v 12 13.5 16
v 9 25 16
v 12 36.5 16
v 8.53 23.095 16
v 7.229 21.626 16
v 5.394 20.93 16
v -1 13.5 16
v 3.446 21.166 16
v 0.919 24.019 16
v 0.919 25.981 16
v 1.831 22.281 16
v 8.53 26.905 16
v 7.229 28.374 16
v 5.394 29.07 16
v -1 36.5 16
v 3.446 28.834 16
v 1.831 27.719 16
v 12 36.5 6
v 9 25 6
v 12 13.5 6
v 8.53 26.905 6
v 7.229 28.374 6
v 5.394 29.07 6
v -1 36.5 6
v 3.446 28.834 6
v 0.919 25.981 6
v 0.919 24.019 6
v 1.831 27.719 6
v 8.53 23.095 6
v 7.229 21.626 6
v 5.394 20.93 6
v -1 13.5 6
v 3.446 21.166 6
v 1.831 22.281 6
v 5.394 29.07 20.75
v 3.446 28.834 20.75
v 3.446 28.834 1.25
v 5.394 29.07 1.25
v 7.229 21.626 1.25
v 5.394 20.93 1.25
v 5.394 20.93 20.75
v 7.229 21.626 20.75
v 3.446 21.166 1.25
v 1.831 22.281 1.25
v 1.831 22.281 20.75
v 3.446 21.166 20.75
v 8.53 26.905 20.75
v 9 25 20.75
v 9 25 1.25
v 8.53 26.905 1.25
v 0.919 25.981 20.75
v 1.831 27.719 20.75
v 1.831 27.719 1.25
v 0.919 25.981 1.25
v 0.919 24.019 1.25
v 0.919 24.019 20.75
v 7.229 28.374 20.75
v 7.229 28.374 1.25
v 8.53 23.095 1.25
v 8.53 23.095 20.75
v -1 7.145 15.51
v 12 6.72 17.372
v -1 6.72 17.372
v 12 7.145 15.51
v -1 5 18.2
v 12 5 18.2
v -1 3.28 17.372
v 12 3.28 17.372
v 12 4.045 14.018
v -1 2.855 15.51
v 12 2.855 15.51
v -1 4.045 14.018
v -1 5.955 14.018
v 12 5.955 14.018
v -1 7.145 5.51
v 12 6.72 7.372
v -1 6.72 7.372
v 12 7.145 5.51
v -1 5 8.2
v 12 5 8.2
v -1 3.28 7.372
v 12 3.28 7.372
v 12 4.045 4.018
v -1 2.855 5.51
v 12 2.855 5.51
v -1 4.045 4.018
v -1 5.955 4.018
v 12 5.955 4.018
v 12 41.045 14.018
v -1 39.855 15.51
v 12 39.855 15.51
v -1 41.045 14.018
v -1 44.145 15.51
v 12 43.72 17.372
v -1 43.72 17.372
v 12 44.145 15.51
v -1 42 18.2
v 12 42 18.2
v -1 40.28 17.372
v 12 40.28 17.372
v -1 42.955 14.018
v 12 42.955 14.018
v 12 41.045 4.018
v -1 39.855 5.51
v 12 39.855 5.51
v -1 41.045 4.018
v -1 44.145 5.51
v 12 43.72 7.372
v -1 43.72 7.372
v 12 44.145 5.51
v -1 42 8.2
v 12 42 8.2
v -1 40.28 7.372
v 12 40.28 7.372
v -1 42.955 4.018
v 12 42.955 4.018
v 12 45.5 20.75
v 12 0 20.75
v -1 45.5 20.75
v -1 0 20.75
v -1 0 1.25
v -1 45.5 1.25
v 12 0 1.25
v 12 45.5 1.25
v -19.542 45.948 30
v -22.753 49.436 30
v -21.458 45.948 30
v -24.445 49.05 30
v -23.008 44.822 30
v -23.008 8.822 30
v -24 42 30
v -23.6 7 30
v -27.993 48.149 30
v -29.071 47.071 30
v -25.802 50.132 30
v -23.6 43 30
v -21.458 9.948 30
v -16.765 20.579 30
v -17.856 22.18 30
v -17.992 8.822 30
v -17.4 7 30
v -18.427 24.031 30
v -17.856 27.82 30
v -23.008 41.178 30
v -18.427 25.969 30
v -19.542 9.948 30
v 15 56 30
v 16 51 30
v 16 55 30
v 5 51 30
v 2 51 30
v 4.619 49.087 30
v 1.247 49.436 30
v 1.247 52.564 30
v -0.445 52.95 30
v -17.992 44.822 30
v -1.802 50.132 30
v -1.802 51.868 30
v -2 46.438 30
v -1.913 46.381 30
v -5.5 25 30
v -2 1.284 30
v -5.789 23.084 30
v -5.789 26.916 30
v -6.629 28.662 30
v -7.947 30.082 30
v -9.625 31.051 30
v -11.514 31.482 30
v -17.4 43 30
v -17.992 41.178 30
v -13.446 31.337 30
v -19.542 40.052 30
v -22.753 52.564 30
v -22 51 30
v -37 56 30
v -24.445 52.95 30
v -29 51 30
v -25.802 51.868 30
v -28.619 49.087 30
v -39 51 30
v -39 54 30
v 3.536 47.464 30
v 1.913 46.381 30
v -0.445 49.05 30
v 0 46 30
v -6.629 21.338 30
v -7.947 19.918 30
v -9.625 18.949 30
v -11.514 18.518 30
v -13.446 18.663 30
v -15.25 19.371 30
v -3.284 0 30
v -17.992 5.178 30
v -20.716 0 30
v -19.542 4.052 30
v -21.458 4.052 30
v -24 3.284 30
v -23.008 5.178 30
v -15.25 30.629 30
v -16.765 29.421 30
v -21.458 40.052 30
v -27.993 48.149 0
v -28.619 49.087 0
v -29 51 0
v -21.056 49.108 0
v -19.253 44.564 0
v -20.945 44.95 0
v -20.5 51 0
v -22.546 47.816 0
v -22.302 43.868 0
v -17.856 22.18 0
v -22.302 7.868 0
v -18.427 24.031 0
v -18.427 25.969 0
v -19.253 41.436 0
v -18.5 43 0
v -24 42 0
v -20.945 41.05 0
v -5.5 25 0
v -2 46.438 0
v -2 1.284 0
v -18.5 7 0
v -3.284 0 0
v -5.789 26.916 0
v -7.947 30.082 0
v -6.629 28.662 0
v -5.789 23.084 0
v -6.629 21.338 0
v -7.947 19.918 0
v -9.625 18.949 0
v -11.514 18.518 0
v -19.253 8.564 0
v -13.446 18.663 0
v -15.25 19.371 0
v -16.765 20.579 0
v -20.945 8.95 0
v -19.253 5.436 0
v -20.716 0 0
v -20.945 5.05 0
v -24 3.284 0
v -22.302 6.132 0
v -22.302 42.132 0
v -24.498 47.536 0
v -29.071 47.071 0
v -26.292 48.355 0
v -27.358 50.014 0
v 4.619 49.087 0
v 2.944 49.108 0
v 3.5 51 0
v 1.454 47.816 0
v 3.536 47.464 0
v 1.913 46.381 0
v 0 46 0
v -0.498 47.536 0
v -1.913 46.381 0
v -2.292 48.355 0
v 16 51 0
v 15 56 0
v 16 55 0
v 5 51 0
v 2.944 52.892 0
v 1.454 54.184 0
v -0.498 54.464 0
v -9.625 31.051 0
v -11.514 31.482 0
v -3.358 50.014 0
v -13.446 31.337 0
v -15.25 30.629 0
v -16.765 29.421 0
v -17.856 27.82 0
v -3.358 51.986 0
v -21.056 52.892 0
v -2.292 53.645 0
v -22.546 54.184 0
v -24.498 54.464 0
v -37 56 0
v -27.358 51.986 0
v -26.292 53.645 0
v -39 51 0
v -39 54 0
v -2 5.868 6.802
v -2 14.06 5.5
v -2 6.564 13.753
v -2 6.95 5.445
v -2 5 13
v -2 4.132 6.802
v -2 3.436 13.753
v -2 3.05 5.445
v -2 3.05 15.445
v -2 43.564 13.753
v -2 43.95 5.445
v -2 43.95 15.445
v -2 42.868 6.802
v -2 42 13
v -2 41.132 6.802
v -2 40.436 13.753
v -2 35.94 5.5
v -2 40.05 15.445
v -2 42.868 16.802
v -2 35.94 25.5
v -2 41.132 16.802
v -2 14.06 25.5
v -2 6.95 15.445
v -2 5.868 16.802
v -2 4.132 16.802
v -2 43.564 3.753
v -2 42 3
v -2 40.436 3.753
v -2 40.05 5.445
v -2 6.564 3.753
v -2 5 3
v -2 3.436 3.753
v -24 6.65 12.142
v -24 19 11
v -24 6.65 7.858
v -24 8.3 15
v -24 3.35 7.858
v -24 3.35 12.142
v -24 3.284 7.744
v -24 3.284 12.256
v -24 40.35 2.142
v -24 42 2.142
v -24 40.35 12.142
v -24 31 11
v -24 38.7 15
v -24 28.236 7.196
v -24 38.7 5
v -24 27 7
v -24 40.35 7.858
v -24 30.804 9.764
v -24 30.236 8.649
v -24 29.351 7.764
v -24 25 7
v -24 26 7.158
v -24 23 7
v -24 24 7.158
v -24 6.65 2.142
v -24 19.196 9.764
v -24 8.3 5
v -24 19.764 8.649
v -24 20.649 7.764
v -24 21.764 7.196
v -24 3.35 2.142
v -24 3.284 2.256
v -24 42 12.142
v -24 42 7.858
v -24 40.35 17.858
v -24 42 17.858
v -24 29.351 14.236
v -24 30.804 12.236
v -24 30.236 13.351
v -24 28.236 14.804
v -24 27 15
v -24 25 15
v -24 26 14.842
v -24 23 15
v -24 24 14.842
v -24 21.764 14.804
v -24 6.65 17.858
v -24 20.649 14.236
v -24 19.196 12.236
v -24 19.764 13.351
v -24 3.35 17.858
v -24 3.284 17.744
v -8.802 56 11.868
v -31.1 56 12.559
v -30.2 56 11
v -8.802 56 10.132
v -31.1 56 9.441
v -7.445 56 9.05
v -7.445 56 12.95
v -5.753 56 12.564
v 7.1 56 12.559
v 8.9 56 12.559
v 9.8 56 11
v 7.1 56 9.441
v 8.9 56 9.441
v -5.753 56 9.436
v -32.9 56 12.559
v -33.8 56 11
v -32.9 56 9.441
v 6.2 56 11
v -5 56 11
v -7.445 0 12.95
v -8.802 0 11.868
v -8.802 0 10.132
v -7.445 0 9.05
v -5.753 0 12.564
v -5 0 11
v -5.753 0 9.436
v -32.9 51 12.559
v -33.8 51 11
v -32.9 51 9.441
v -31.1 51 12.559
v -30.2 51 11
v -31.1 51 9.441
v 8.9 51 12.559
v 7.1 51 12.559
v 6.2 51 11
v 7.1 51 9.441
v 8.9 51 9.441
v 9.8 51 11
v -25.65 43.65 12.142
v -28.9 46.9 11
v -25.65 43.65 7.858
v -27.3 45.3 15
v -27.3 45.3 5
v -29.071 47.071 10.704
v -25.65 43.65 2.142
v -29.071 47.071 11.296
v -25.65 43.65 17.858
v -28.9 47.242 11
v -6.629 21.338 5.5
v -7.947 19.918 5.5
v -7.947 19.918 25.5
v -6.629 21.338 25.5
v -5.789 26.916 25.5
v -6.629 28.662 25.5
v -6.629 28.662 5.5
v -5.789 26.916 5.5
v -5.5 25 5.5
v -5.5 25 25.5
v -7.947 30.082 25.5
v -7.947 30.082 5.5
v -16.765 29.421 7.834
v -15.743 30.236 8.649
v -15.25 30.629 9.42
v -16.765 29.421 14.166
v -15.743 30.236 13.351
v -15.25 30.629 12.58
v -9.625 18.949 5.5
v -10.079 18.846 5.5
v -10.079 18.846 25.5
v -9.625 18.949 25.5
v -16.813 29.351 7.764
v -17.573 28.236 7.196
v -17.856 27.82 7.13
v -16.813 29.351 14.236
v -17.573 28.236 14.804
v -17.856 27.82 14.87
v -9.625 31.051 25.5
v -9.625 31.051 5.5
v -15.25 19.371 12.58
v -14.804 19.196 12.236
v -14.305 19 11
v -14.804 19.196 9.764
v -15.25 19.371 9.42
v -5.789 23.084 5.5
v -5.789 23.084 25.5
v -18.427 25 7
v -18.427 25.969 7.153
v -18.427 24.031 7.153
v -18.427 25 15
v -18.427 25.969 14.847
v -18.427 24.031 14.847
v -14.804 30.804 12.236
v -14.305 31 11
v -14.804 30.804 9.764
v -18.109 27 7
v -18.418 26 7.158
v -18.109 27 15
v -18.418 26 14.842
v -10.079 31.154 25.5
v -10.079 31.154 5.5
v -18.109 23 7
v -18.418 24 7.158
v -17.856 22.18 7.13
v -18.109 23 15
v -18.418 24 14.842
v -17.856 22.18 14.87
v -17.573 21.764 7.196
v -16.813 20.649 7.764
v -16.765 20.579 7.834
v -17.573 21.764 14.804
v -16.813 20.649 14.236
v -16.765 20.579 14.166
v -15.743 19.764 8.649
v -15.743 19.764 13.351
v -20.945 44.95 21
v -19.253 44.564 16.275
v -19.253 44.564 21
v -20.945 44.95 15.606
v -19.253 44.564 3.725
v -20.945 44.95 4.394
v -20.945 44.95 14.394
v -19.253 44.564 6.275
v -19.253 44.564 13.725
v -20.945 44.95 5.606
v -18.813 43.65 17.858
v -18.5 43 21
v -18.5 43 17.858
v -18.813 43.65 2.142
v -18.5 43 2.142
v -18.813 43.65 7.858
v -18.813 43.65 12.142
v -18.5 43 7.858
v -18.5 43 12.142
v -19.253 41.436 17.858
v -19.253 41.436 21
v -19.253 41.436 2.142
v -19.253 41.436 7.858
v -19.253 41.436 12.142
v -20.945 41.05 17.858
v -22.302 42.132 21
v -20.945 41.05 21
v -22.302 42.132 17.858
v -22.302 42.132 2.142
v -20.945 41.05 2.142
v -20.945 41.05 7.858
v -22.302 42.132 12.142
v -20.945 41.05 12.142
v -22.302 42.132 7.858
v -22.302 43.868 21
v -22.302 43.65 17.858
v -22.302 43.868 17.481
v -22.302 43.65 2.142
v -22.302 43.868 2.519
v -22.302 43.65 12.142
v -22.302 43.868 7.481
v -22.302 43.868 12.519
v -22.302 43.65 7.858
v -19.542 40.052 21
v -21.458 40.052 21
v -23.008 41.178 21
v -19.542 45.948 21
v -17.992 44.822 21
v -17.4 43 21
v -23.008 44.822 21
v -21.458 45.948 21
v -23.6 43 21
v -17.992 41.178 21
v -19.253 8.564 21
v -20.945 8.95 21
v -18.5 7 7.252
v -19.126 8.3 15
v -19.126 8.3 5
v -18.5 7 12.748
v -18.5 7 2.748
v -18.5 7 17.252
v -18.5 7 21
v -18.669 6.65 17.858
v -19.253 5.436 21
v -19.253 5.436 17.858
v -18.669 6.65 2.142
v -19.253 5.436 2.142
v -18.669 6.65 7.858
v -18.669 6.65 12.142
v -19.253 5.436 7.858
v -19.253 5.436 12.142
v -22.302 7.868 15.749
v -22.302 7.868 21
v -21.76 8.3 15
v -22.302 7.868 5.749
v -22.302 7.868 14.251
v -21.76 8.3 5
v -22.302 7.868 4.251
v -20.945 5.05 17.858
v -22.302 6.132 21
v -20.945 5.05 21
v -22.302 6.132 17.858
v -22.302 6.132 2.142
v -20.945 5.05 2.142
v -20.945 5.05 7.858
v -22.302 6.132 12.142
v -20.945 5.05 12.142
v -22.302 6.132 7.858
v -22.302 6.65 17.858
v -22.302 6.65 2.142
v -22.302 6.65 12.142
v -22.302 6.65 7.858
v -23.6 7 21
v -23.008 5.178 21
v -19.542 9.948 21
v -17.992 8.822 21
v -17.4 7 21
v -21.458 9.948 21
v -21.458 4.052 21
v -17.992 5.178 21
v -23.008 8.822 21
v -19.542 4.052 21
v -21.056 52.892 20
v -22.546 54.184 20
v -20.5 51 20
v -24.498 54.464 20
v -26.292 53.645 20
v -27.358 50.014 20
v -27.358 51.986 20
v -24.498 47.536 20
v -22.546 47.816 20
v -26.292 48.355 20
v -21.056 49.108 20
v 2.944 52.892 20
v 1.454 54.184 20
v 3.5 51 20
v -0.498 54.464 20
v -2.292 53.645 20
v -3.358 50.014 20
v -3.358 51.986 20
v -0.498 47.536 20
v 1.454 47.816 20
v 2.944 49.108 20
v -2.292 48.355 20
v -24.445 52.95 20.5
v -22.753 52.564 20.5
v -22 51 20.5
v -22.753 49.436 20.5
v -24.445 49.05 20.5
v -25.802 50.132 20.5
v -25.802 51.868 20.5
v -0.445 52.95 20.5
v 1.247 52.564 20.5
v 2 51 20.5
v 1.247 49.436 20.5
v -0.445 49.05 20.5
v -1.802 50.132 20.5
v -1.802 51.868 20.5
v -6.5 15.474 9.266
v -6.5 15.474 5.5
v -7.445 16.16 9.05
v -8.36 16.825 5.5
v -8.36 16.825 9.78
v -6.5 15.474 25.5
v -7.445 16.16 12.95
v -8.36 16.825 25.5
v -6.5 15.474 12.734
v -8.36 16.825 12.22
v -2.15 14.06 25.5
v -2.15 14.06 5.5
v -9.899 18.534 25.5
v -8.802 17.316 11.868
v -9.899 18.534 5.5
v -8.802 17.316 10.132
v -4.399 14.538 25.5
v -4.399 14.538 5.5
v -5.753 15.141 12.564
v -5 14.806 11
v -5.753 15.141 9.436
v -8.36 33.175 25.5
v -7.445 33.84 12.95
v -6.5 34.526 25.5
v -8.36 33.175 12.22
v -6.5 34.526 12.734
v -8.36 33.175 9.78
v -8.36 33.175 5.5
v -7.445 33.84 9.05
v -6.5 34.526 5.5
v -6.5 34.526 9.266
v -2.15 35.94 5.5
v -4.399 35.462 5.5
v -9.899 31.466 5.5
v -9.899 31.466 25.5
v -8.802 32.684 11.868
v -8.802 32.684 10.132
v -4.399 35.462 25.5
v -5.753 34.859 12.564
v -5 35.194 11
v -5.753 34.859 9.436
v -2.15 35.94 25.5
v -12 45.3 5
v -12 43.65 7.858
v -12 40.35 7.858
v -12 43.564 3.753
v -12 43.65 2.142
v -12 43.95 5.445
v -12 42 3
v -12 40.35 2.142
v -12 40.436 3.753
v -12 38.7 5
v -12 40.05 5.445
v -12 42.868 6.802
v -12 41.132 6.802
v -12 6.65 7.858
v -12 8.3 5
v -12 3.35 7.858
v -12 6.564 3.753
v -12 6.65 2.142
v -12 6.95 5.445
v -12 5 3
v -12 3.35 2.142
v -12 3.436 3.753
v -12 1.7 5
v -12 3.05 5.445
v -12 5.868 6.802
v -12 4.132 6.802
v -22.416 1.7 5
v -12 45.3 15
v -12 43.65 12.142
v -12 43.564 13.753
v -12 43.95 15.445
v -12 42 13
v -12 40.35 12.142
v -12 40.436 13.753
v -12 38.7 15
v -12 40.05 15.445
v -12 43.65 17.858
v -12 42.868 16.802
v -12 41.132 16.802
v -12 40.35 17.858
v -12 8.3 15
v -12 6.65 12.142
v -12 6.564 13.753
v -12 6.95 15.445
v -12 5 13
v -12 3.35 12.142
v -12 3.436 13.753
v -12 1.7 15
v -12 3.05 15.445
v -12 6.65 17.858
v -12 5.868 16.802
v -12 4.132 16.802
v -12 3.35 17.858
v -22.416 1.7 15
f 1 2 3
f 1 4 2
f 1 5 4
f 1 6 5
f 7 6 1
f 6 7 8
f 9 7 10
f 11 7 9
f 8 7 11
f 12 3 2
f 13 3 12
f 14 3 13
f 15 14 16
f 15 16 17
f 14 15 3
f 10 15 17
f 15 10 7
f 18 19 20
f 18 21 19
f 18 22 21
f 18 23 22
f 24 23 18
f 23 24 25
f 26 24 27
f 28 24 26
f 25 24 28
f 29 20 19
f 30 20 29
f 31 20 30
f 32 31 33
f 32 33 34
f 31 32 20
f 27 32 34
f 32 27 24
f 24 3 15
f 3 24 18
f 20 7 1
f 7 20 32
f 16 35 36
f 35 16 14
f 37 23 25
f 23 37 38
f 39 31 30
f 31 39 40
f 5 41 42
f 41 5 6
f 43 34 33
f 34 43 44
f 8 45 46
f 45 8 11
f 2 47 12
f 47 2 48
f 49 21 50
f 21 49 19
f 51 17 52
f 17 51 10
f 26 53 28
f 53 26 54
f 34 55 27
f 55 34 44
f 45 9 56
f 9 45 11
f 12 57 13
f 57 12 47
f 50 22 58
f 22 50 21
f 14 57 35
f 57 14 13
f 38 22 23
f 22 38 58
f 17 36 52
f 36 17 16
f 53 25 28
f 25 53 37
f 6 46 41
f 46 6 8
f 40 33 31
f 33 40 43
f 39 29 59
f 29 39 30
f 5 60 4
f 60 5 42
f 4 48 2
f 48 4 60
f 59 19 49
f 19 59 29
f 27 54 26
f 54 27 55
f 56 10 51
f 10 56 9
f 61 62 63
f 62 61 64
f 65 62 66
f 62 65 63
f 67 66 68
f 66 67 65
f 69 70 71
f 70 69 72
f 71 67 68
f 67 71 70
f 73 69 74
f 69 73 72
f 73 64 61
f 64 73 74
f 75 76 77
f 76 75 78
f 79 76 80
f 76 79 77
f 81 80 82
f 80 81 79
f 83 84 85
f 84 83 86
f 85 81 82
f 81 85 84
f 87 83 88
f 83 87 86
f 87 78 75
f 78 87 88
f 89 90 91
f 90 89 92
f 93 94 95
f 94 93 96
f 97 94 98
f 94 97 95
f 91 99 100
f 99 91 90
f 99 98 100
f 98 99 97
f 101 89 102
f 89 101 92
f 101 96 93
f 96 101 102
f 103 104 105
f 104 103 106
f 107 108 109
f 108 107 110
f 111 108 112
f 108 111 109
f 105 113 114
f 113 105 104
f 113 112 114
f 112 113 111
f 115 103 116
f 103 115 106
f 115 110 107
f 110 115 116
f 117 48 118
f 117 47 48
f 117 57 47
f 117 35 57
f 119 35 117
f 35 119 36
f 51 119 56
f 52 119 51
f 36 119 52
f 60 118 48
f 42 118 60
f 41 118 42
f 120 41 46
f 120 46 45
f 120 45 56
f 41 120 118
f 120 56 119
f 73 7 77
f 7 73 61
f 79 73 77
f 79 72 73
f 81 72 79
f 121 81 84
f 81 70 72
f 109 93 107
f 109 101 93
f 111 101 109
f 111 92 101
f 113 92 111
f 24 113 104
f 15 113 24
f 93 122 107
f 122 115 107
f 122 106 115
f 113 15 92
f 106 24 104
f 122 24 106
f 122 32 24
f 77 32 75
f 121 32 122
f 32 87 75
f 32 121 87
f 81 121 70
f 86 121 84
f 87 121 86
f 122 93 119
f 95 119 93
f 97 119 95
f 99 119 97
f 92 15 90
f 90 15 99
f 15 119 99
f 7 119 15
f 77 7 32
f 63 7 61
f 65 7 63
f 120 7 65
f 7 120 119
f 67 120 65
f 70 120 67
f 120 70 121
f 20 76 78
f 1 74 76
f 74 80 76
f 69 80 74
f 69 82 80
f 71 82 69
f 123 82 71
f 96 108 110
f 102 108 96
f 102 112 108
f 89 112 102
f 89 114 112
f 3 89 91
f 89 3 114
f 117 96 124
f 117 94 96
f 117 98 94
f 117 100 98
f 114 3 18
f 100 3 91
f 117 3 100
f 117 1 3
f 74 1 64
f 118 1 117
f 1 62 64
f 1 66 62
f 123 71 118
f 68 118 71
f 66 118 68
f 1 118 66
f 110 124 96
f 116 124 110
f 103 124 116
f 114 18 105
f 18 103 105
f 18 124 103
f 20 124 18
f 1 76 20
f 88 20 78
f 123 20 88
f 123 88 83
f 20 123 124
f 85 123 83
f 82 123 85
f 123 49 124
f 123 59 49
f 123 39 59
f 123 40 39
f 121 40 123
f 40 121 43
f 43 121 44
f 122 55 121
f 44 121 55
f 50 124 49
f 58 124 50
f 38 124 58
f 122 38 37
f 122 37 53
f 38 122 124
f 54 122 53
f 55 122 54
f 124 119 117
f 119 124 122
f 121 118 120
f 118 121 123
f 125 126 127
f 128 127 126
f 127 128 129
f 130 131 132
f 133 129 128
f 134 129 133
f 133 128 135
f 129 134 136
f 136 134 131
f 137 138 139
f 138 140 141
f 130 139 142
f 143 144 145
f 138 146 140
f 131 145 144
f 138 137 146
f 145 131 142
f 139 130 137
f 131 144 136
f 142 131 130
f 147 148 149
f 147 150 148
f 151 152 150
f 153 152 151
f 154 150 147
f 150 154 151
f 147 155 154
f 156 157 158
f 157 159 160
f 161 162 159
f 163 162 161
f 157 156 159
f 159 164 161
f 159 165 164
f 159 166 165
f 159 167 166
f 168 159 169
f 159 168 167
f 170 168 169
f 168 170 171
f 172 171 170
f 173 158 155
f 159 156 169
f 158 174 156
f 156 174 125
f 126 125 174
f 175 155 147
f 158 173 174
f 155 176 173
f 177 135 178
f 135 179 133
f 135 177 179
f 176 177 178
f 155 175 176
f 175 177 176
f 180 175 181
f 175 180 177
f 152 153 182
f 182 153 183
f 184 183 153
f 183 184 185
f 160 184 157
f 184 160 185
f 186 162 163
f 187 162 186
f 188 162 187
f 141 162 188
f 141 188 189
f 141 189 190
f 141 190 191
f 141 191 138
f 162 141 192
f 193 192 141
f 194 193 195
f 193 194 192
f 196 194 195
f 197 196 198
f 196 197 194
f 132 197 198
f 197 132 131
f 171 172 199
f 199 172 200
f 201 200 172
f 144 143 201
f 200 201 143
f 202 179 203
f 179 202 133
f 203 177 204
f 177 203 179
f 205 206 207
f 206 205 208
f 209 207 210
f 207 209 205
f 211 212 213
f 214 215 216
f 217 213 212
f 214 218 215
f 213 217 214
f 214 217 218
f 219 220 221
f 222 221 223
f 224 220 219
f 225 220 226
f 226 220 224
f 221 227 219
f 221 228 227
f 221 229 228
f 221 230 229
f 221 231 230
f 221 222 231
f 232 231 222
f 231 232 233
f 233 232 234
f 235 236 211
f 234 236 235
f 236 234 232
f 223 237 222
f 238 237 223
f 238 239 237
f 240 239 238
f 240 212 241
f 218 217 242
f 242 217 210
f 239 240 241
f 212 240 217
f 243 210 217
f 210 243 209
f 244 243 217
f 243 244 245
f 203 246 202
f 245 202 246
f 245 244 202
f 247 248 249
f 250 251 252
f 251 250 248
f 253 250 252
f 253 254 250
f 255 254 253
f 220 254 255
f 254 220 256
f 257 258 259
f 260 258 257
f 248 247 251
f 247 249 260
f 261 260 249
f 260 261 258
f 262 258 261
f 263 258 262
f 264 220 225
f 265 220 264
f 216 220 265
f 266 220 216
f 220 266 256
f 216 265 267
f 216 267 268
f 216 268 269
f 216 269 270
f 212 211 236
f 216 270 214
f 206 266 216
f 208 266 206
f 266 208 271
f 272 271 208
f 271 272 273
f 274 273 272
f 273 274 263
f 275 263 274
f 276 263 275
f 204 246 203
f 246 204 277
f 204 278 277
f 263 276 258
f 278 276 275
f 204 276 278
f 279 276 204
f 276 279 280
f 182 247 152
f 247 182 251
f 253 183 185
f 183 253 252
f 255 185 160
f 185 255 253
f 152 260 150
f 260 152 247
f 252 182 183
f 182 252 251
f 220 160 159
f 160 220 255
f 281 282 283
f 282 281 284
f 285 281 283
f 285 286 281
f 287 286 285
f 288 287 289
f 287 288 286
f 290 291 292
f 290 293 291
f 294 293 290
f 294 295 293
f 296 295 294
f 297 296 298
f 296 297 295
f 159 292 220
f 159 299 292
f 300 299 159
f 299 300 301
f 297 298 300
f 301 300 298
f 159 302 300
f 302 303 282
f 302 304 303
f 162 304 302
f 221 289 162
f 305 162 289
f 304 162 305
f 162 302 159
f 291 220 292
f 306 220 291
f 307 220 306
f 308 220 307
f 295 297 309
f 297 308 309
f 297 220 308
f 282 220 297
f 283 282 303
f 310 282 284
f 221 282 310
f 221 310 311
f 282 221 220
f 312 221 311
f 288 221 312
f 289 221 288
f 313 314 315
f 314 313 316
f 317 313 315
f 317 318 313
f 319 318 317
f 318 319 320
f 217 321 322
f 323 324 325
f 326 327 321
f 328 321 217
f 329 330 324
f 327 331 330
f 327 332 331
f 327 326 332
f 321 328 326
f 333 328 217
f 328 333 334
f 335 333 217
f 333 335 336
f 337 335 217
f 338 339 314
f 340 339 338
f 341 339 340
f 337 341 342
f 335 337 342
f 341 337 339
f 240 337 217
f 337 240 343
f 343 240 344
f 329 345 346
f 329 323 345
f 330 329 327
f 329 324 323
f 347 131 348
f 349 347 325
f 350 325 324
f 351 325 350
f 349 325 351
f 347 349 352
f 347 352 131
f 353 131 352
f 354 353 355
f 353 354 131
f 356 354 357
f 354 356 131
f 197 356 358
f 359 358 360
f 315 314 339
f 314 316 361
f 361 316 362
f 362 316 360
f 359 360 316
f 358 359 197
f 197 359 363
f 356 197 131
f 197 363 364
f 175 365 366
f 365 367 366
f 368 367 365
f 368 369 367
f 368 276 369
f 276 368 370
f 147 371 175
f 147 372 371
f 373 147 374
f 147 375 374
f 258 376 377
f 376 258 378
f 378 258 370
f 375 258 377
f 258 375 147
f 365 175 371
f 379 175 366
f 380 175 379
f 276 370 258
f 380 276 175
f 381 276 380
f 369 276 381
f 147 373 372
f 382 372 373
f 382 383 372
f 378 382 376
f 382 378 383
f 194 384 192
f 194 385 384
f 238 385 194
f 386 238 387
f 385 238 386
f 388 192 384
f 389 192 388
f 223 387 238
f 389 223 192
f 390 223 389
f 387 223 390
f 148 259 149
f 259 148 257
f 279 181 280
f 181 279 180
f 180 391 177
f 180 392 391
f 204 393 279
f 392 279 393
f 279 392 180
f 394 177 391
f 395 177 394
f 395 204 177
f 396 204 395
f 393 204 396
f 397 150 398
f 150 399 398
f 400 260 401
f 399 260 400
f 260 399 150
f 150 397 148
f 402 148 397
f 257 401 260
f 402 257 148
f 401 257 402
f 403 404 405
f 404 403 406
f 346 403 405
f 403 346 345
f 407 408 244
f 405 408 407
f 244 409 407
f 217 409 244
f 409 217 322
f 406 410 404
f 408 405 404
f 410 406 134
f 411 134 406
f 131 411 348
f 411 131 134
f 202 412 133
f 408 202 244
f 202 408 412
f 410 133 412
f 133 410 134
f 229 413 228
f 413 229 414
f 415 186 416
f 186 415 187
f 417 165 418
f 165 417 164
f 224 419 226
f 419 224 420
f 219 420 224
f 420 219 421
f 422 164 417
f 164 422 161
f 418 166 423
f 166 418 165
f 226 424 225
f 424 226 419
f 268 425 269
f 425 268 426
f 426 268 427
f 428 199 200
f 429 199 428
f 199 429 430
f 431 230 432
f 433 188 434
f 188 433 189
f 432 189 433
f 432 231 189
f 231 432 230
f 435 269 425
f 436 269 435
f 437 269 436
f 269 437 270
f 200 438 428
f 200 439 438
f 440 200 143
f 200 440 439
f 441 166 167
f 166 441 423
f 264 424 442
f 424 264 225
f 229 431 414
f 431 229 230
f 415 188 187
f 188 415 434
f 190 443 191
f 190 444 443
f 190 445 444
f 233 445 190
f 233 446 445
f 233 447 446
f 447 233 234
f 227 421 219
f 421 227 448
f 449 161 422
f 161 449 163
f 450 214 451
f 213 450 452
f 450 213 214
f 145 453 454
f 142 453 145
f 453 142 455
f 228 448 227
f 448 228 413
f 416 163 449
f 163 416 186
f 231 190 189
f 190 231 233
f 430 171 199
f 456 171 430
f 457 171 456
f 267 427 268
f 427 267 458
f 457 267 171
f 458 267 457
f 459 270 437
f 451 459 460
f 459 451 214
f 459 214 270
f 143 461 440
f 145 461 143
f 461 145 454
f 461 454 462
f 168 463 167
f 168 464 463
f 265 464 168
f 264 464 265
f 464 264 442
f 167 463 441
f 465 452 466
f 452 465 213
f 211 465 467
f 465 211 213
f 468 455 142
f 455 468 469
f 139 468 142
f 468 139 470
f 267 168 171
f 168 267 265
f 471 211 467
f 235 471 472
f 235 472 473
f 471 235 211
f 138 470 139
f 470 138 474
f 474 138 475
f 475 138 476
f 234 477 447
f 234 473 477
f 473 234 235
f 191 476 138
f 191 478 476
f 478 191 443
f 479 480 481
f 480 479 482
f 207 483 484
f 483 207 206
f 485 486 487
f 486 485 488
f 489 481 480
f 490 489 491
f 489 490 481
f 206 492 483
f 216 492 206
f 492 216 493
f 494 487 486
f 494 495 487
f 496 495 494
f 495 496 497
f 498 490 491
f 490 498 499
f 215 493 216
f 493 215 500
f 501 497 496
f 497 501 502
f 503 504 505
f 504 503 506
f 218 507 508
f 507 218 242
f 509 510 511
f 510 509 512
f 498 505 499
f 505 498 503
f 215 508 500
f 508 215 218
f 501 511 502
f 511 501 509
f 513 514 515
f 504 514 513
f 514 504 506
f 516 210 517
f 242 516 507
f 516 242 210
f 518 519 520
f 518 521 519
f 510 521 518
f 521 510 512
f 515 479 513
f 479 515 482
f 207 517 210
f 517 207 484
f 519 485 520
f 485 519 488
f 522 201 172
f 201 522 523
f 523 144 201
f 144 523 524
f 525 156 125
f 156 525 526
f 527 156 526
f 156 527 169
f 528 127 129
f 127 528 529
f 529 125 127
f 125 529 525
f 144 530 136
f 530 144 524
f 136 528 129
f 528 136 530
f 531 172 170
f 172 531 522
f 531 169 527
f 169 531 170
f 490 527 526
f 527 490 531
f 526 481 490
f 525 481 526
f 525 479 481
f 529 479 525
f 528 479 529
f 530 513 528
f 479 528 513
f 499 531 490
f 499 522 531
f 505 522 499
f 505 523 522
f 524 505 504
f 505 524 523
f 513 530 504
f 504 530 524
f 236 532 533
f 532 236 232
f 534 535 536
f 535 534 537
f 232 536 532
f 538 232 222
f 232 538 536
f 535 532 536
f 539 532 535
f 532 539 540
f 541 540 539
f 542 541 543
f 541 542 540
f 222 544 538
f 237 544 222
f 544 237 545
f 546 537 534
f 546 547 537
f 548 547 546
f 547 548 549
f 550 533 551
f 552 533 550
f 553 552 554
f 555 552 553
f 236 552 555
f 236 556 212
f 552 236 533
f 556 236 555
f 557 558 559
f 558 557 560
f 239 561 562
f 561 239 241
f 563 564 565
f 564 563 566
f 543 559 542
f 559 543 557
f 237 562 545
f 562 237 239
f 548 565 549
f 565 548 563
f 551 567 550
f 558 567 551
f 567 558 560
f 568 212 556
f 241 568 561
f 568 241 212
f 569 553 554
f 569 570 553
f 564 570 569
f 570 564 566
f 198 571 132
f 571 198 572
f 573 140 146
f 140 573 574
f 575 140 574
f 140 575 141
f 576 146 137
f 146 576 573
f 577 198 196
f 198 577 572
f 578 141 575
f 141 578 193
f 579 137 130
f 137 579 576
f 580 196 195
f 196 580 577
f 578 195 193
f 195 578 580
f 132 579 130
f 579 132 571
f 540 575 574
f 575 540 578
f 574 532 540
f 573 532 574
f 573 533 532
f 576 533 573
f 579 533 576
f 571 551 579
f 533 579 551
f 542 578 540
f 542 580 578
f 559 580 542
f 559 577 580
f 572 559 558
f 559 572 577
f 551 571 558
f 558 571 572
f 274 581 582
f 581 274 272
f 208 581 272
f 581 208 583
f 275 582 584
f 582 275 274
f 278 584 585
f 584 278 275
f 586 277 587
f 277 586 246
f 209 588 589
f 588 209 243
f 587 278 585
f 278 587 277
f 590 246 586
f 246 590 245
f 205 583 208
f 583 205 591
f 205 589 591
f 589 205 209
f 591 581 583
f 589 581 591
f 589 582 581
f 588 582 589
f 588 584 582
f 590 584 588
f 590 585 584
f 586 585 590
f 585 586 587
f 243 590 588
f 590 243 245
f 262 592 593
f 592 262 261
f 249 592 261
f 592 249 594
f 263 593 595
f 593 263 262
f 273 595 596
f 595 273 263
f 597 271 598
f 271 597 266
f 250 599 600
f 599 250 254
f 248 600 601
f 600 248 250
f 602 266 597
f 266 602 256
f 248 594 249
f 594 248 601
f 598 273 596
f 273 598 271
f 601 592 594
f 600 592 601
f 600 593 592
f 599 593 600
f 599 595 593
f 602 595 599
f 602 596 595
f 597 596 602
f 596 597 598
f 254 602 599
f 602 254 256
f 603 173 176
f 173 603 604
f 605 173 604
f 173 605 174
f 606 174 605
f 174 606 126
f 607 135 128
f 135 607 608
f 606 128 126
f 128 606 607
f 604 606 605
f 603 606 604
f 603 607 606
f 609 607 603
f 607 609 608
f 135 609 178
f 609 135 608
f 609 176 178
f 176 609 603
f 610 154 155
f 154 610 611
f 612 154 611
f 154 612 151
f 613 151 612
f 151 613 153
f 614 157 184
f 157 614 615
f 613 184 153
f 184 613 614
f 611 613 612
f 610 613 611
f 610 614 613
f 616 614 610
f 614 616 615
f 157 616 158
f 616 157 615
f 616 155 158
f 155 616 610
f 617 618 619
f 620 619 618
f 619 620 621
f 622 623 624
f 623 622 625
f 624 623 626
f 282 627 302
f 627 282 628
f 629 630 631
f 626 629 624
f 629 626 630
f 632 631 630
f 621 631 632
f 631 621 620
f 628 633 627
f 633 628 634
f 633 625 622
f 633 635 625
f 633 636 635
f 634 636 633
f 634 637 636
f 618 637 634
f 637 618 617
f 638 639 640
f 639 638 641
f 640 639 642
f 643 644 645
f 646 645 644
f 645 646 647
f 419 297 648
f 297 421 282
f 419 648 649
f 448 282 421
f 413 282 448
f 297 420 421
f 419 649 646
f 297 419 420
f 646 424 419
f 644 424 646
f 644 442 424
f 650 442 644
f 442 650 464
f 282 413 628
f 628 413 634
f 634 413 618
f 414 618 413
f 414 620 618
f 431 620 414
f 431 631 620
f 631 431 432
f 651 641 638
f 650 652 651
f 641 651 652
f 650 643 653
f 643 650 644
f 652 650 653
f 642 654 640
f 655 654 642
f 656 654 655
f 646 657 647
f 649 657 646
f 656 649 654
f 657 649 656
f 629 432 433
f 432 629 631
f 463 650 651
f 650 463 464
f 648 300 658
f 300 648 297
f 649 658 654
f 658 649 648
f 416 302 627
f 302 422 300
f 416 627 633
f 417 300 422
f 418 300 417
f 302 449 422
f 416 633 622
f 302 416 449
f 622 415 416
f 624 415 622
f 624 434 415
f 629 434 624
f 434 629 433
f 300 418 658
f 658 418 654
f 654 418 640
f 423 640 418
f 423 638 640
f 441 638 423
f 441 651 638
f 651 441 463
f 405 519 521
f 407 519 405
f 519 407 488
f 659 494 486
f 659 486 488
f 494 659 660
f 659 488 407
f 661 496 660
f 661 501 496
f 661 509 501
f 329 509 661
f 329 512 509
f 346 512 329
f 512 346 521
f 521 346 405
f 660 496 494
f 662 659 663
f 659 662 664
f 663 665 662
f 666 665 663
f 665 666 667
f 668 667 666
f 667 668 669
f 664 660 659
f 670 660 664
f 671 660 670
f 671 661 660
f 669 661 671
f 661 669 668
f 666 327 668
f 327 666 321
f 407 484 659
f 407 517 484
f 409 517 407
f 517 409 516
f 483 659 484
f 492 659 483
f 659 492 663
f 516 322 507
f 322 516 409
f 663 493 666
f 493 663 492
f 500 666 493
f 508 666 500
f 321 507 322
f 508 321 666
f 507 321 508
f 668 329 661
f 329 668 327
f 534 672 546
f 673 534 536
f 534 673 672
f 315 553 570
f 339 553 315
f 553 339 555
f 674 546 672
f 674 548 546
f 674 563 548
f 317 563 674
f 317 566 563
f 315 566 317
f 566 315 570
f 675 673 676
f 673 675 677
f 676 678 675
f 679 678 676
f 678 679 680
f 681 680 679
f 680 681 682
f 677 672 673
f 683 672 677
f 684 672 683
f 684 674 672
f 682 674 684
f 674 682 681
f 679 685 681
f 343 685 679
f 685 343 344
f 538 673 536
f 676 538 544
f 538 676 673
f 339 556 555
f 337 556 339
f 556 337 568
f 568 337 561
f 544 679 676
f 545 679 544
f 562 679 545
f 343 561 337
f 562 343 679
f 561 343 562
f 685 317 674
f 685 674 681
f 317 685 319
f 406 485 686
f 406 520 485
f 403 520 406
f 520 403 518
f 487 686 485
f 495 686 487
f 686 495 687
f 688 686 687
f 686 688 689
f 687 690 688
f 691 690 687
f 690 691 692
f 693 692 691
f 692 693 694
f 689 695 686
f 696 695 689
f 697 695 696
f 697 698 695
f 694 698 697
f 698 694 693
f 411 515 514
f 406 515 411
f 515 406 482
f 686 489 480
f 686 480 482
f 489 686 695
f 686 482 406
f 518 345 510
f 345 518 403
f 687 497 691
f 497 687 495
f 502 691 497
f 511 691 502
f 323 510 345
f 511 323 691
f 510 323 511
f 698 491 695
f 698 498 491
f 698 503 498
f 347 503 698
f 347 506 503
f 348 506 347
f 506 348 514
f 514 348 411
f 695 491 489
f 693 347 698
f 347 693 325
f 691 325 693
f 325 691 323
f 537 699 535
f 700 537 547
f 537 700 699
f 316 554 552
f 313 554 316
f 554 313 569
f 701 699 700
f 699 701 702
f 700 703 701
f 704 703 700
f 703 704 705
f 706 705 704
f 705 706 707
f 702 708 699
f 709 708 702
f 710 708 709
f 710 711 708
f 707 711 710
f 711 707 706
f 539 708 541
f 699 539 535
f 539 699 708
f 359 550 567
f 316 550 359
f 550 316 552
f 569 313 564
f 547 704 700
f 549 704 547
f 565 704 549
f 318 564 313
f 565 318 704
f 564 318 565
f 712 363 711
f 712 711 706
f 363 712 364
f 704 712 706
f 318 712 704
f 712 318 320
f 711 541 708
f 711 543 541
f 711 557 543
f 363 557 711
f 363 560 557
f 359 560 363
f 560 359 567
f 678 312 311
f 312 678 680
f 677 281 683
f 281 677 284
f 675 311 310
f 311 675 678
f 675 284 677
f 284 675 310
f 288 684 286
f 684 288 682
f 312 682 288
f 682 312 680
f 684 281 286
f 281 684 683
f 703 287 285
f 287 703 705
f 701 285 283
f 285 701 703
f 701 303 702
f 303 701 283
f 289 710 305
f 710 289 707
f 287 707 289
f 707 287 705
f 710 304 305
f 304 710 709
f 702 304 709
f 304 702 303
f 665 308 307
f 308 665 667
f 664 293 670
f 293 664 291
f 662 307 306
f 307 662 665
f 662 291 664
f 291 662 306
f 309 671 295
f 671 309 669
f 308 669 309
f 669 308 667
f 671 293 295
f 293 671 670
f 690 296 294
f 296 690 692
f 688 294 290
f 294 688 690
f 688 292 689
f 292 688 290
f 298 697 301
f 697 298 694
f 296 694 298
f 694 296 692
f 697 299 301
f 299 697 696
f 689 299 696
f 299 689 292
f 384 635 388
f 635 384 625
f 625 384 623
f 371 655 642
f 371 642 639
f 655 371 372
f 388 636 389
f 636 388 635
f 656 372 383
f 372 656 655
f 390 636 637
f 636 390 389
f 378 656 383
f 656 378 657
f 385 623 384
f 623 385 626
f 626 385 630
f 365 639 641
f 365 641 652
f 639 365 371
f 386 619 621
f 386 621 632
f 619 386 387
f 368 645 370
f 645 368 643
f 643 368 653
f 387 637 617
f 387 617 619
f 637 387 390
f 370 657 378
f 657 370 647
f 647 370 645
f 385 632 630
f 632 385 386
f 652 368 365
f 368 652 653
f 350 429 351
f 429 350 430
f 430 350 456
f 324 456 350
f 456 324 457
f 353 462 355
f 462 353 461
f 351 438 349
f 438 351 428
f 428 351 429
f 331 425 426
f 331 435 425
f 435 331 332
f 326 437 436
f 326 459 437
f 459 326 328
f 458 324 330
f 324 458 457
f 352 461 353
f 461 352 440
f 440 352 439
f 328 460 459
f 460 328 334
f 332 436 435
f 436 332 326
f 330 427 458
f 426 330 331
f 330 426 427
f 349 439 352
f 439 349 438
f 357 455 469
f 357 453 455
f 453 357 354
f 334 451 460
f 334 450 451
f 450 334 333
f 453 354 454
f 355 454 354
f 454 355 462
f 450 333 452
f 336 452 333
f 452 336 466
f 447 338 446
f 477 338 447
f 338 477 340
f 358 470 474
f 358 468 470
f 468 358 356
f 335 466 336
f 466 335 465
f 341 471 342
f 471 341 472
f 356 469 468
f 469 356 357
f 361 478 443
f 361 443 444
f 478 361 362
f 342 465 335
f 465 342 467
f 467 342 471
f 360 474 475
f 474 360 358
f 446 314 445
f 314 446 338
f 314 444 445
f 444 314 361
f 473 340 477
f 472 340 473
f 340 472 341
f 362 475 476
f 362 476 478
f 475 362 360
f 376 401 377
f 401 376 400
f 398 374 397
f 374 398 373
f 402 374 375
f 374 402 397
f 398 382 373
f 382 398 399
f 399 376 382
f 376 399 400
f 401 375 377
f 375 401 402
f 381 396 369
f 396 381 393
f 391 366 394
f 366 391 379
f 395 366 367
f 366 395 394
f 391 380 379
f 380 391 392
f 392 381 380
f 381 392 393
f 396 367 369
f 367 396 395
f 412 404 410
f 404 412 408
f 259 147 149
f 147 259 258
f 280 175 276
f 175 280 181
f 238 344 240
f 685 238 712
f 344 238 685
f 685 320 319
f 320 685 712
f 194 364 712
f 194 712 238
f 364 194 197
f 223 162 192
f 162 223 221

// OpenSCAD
// file: ../configuration.scad
x_rod_distance = 45;

// Select your belt type ******************************************************

//T2.5
belt_tooth_distance = 2.5;
belt_tooth_ratio = 0.5;

//T5 (strongly discouraged)
//belt_tooth_distance = 5;
//belt_tooth_ratio = 0.75;

//HTD3
//belt_tooth_distance = 3;
//belt_tooth_ratio = 0.75;

//MXL
//belt_tooth_distance = 2.032;
//belt_tooth_ratio = 0.64;

// Select your hot-end mount ******************************************************

// 0 = none; 1 = groove-mount (J-head/MakerGear etc.)
hotend_mount = 0;

hotend_groovemount_depth = 5;
hotend_groovemount_diameter = 16;
// main file
// PRUSA iteration3
// Compact extruder
// GNU GPL v3
// Josef Průša <iam@josefprusa.cz> and contributors
// http://www.reprap.org/wiki/Prusa_Mendel
// http://prusamendel.org

include <../configuration.scad>



module motor_dummy(){
	translate([-22,-22,-5]) %cube([44,44,5]);
	translate([18,18,-5]) %cylinder(r=2, h=24);
	translate([18,-18,-5]) %cylinder(r=2, h=24);
	translate([-18,18,-5]) %cylinder(r=2, h=24);
	translate([-18,-18,-5]) %cylinder(r=2, h=24);
	translate([-22+2.5+10,0,-5]) %cylinder(r=2.5, h=7);
	
}

module extruder_base(){
 // Main body
 translate([-1,-2,0]) cube([22,56,30]);
 // Extruder plate mount
 if (hotend_mount == 1) { // groove-mount
  translate([-16,49,0]) cube([55,5 + hotend_groovemount_depth - 1.5,24]);
 } else {
  translate([-16,49,0]) cube([55,5,30]);
 }
 
 // Carriage mount cylinders
 translate([11,25,0]){
  translate([-12,24,0]) cylinder(r=5, h=30);
  translate([12,24,0]) cylinder(r=5, h=30);
 }

 // Smoother join
 translate([1,38,0]) rotate([0,0,45])  cube([10,10,30]);
}

module extruder_holes(){
 translate([11,25,0]){ // Translate to center of the main block
  // Main shaft opening
  translate([0,-2,-1]) cylinder(r=6.5, h=36);

  // Lower motor mount hole
  translate([-8.5,18-2,-1]) cylinder(r=2, h=35);
  translate([-8.5,18-2,21]) cylinder(r=3.1, h=35);
  // Upper motor mount hole
  translate([-8.5,-18-2,-1]) cylinder(r=2, h=35);
  translate([-8.5,-18-2,21]) cylinder(r=3.1, h=35);
  // Idler motor mount hole
  translate([-8.5+36,18-2,-1]) cylinder(r=2, h=35);
  translate([-8.5+36,18-2,21]) cylinder(r=3.1, h=35);

  // Carriage mount right screw head hole
  translate([-12,24,-3]) cylinder(r=3.5, h=23);
  // Carriage mount left screw head hole
  translate([12,24,-3]) cylinder(r=3.5, h=23);
  // Carriage mount right screw hole
  translate([-12,24,20.5]) cylinder(r=2, h=23);
  // Carriage mount left screw head hole
  translate([12,24,20.5]) cylinder(r=2, h=23);
  // Idler bearing cutout
  translate([11,0-2,-4.5+10]) cylinder(r=11, h=20);
 }
 // Filament path
 translate([1.5+11+3.5,65,11]) rotate([90,0,0]) cylinder(r=2, h=70);
 if (hotend_mount == 1) {
  // Hole for hotend
  translate([1.5+11+3.5,65,11]) rotate([90,0,0]) cylinder(r=hotend_groovemount_diameter/2, h=12.5);
 }
 // Hole for drive gear check
 translate([1.5+11+3.5-30,25,11]) rotate([90,0,90]) cylinder(r=4, h=70, $fn=20);
 translate([1.5+11+3.5-30,23,11]) rotate([90,0,90]) cylinder(r=4, h=70, $fn=20);
 translate([1.5+11+3.5-30,21,11]) rotate([90,0,90]) cylinder(r=4, h=70, $fn=20);

 // Left extruder plate mounting hole
 translate([1.5+11+3.5+15,65,11]) rotate([90,0,0]) cylinder(r=1.8, h=70);
 translate([1.5+11+3.5+15,47,11]) rotate([90,0,0]) cylinder(r=3.1, h=70, $fn=6);
 // Right extruder plate mounting hole
 translate([1.5+11+3.5-25,65,11]) rotate([90,0,0]) cylinder(r=1.8, h=70);
 translate([1.5+11+3.5-25,47,11]) rotate([90,0,0]) cylinder(r=3.1, h=70, $fn=6);

  // Idler mounting holes
  translate([11,25,10]){
   // Nut traps
   translate([-30,15,-5]) rotate([0,90,0]) rotate([0,0,30]) cylinder(r=3.3, h=30, $fn=6);
   translate([-30,-22,-5]) rotate([0,90,0]) rotate([0,0,30]) cylinder(r=3.3, h=30, $fn=6);
   translate([-30,15,5]) rotate([0,90,0]) rotate([0,0,30]) cylinder(r=3.3, h=30, $fn=6);
   translate([-30,-22,5]) rotate([0,90,0]) rotate([0,0,30]) cylinder(r=3.3, h=30, $fn=6);
   // Screws
   translate([-30,-22,-5]) rotate([0,90,0]) cylinder(r=2, h=70);
   translate([-30,-22,5]) rotate([0,90,0]) cylinder(r=2, h=70);
   translate([-30,15,-5]) rotate([0,90,0]) cylinder(r=2, h=70);
   translate([-30,15,5]) rotate([0,90,0]) cylinder(r=2, h=70);
	}

 translate([46,46,-1]) rotate([0,0,45]) cube([20,20,36]);
 translate([46,13,-1]) rotate([0,0,45]) cube([20,20,36]);
 translate([-22,46,-1]) rotate([0,0,45]) cube([20,20,36]);
 translate([-22,24,-1]) rotate([0,0,45]) cube([20,20,36]);
 translate([-8,-20,-1]) rotate([0,0,45]) cube([20,20,36]);
 translate([30,-20,-1]) rotate([0,0,45]) cube([20,20,36]);
}

module extruder_idler_base(){
 translate([0.25,0,0]) cube([19.5,45.5,8+5]);
	
}

module extruder_idler_holes(){
 translate([10,25,0]){
  // Main cutout
  cube([10,23,27], center= true);
  // Idler shaft
  translate([-12,0,4.1+3])rotate([0,90,0])cylinder(r=4.1, h=24);
  // Screw holes
  translate([5,-20,-1])cylinder(r=2.2, h=24);
  translate([-5,-20,-1])cylinder(r=2.2, h=24);
  translate([5,17,-1])cylinder(r=2.2, h=24);
  translate([-5,17,-1])cylinder(r=2.2, h=24);
 }
}


// Idler final part
module idler(){
 difference(){
  extruder_idler_base();
  extruder_idler_holes();
 }
}

translate([12,0,1]) rotate([0,-90,0]) idler();
//translate([-47,-2,0])  idler();
// Extruder final part
module extruder(){
 translate([-23,2,0])difference(){
  extruder_base();
  extruder_holes();
 }
}

extruder();
//translate([-2.5,25,0]) motor_dummy();
